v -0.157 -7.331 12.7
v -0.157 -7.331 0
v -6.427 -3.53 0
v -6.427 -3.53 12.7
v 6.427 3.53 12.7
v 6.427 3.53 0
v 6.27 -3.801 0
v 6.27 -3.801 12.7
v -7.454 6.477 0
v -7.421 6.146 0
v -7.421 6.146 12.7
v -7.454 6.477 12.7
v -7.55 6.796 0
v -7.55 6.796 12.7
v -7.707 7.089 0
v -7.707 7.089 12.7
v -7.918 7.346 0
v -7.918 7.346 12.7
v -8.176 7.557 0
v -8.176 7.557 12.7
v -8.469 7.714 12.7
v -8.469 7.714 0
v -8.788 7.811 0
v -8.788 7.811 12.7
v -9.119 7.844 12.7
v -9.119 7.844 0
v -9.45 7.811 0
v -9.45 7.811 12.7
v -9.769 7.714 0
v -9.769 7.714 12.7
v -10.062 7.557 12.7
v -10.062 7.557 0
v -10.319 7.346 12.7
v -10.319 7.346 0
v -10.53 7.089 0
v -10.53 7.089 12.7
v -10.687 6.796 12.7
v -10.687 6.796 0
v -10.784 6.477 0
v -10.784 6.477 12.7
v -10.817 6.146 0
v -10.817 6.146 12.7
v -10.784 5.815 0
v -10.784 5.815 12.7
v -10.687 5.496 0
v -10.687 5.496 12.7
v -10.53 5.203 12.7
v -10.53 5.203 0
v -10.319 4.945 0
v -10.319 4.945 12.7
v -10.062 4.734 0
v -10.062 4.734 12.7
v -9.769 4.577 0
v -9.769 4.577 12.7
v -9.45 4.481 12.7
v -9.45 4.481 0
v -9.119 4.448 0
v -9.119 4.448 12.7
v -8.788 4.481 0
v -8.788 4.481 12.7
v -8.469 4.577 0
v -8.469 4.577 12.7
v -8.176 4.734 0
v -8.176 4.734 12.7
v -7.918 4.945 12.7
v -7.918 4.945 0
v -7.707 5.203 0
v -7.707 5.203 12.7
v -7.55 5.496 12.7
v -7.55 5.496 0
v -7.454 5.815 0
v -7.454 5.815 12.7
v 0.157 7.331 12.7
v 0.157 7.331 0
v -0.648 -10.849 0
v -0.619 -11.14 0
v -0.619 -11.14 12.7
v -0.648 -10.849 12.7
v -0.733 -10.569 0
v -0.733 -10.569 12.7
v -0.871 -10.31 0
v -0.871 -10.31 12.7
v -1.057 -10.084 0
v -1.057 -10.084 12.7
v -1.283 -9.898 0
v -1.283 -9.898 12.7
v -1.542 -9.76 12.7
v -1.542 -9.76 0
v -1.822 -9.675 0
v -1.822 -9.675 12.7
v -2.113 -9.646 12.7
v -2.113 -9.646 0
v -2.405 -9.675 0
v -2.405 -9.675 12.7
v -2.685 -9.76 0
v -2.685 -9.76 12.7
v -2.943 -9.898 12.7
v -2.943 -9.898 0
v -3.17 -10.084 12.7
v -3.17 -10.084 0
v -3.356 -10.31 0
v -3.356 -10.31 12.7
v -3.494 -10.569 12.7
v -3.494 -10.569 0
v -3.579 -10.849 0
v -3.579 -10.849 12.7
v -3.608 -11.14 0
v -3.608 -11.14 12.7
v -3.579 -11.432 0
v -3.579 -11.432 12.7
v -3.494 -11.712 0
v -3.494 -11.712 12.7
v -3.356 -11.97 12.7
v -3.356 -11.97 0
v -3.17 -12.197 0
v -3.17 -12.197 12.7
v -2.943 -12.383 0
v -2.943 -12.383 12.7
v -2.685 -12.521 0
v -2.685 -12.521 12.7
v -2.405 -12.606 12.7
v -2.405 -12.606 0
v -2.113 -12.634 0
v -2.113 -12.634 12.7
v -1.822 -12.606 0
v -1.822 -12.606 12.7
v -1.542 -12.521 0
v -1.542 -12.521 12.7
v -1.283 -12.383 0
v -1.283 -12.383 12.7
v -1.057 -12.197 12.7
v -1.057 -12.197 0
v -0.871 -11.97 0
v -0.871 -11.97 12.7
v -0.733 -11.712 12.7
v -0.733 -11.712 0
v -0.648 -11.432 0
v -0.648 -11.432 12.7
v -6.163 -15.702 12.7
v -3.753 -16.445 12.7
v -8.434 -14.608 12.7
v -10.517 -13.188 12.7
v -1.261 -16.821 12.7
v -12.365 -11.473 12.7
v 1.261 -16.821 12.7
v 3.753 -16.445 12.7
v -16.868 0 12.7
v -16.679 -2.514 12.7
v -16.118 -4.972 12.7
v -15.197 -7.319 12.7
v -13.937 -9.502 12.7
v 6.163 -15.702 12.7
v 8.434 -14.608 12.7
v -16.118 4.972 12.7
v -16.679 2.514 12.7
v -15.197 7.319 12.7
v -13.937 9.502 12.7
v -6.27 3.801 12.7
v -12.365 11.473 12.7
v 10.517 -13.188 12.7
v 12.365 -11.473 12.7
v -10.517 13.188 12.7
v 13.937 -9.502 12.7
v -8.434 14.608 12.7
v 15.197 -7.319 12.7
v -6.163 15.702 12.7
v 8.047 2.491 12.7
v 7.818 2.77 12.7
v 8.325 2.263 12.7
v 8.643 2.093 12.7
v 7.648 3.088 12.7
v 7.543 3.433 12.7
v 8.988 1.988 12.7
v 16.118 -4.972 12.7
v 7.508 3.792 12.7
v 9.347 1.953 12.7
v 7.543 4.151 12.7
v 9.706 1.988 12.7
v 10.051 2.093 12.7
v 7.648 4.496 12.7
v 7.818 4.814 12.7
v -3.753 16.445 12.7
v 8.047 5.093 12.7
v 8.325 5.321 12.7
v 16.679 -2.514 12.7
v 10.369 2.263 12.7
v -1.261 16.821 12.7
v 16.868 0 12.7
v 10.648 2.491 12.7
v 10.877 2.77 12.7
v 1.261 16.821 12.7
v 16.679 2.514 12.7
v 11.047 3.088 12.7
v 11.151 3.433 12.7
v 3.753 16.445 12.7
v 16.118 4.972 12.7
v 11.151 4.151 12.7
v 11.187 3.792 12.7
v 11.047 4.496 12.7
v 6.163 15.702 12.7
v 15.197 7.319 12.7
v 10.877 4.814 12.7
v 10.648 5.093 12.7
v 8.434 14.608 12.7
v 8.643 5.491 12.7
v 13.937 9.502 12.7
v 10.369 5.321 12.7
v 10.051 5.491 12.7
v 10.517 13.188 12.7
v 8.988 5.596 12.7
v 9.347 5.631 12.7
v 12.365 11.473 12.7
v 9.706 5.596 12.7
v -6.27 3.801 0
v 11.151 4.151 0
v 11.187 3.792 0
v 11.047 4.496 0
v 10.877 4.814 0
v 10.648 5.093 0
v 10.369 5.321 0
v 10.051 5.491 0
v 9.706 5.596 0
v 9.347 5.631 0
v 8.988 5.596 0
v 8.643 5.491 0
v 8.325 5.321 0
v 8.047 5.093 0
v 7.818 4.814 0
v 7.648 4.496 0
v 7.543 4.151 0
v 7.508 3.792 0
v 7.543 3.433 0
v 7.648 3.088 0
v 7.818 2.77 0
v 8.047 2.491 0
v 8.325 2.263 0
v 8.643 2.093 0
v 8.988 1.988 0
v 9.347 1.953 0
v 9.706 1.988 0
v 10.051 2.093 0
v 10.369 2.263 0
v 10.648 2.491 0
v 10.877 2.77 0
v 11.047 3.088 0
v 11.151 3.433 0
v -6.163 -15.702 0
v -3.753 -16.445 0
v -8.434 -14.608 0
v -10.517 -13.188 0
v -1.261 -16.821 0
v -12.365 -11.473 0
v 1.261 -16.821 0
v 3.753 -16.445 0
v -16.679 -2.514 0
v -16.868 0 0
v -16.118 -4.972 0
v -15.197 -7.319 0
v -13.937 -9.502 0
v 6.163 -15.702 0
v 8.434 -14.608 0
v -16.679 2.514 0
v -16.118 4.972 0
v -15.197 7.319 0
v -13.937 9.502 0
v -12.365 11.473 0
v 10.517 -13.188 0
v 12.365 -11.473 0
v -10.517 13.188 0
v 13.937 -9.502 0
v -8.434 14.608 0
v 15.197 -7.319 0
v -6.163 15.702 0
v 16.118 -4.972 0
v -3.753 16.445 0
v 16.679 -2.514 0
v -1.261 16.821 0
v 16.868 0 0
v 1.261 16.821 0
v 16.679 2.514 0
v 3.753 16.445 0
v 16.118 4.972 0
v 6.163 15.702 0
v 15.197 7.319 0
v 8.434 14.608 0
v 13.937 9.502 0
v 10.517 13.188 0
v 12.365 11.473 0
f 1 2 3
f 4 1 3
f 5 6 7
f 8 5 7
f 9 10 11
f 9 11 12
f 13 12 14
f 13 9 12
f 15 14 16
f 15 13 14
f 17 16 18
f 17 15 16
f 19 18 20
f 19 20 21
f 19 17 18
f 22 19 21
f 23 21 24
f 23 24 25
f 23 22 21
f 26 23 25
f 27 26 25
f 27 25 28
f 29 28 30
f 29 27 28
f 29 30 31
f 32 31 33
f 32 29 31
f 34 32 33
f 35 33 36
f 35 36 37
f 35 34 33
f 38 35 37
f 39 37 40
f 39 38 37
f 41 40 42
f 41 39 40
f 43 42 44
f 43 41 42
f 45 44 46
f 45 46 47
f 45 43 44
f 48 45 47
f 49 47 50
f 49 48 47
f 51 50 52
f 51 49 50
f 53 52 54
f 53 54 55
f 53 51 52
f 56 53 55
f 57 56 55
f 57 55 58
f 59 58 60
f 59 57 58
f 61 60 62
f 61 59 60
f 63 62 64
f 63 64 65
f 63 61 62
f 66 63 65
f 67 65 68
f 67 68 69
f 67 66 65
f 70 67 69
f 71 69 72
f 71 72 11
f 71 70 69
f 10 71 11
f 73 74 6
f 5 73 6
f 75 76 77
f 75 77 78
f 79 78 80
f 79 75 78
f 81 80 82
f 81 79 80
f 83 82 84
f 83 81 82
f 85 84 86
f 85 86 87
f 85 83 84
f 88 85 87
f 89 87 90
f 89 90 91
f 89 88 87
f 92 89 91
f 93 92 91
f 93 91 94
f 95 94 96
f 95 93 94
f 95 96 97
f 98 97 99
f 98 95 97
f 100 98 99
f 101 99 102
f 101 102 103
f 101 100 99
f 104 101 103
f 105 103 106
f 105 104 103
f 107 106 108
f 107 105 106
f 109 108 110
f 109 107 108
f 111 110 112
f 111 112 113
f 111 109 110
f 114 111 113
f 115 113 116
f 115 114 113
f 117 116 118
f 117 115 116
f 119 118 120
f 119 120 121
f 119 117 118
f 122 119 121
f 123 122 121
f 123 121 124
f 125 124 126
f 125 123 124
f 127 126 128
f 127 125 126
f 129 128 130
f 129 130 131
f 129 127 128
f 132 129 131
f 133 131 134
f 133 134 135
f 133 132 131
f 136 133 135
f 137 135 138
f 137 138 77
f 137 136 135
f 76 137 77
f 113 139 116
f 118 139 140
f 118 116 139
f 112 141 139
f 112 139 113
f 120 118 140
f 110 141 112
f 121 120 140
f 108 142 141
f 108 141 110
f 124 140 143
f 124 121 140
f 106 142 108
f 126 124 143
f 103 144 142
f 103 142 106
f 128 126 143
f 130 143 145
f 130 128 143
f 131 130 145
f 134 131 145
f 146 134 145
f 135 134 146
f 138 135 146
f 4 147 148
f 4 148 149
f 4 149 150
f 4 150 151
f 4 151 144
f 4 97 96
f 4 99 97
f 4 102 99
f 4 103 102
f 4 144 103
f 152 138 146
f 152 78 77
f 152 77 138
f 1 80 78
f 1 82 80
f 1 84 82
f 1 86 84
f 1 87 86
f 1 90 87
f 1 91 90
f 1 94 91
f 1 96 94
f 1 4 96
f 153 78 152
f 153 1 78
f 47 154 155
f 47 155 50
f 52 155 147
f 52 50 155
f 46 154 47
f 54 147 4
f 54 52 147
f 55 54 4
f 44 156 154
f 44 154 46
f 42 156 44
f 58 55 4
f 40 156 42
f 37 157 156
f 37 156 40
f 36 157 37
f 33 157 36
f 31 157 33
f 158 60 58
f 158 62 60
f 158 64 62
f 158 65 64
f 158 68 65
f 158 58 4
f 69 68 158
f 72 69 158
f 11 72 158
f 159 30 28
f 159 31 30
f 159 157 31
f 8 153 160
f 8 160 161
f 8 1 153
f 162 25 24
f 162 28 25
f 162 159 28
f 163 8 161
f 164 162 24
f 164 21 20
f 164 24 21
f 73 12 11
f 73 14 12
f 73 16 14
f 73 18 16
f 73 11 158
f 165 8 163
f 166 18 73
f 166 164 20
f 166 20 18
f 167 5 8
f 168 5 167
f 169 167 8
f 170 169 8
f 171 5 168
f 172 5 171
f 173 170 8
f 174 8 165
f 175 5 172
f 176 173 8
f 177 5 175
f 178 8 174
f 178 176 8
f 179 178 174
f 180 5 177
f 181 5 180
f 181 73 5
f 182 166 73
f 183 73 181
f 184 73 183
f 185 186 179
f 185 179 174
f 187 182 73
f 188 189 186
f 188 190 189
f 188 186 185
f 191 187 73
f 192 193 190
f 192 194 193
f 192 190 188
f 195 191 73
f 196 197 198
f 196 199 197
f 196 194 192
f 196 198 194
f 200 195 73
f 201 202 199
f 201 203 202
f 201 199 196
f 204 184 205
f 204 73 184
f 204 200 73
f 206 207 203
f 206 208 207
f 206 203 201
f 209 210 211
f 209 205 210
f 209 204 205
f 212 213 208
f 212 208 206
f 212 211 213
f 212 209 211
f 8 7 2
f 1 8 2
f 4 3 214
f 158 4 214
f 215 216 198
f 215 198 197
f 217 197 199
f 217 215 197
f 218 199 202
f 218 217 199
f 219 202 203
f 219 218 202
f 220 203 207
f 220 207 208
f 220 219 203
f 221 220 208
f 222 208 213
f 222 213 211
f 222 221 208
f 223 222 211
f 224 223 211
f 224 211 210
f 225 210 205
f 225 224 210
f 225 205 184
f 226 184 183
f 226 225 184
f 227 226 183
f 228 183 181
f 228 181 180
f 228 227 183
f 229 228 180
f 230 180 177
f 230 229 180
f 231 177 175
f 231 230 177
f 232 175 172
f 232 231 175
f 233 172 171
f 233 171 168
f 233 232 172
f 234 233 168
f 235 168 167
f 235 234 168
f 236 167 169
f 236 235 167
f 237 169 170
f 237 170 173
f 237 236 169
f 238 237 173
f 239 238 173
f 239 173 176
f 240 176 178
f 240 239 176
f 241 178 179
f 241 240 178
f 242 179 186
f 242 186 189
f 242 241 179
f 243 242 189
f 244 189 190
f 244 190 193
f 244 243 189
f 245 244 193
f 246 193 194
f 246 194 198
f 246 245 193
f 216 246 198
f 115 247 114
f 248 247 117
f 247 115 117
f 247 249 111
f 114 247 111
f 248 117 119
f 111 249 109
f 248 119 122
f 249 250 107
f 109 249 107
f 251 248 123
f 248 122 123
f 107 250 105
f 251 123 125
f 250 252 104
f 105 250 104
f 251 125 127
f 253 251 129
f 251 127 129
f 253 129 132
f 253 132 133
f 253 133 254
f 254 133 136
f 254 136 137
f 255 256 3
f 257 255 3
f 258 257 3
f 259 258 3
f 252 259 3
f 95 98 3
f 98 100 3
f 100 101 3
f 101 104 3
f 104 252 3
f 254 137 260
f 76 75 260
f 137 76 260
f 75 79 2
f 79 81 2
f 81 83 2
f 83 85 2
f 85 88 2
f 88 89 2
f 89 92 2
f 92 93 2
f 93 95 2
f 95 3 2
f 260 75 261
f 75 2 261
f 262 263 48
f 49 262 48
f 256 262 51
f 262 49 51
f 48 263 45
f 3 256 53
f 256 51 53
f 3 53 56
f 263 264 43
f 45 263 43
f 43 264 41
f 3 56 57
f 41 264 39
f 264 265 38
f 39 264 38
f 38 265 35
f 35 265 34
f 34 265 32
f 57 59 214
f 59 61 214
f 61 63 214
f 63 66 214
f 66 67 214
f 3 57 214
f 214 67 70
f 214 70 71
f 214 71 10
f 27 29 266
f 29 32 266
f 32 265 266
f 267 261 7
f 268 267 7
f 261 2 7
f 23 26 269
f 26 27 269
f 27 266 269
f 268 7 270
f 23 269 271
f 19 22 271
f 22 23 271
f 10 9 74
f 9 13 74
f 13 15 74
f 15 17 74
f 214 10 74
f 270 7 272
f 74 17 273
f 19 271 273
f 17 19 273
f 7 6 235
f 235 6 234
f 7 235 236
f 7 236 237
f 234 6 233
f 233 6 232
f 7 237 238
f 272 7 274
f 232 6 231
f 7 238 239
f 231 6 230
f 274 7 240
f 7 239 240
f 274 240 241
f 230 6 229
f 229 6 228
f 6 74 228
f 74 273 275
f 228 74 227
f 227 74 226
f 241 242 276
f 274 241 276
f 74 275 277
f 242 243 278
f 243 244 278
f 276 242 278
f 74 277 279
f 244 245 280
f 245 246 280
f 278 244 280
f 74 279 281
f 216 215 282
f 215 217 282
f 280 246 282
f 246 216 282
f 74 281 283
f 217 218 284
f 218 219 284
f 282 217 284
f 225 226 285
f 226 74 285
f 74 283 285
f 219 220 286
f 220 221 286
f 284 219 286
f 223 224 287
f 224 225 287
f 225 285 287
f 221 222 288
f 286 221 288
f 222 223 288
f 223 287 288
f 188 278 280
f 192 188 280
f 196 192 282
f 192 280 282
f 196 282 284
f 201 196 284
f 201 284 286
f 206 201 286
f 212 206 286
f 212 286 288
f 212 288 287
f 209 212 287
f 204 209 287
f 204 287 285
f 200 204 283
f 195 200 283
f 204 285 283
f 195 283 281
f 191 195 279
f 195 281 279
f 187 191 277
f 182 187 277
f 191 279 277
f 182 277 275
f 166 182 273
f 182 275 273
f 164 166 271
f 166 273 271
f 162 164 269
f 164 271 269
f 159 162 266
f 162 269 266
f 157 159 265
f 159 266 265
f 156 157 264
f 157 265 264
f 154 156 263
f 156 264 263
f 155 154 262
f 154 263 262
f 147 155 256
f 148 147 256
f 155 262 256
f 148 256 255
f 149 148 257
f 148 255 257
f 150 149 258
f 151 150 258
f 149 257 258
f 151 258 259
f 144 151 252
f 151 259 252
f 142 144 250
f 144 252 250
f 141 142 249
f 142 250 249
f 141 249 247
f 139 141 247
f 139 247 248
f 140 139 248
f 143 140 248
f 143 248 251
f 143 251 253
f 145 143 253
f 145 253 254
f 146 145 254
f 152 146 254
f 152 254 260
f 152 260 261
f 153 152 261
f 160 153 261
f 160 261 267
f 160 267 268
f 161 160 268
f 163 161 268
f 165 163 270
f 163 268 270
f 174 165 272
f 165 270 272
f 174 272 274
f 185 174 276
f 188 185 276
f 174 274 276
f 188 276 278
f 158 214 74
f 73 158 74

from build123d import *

# Parameters (mm, degrees)
SKETCH2_R           = 16.86788292
SKETCH2_R_2         = 1.697640298
SKETCH2_R_3         = 1.839394333
SKETCH2_R_4         = 1.494089935
BOSS_EXTRUDE1_DEPTH = 12.7


with BuildPart() as part:
    # Sketch2 → Boss-Extrude1 (new body)
    with BuildSketch(Plane.XY):
        Circle(SKETCH2_R)
        with Locations((-9.118891252, 6.145879466)):
            Circle(SKETCH2_R_2, mode=Mode.SUBTRACT)
        with Locations((9.347171253, 3.791989153)):
            Circle(SKETCH2_R_3, mode=Mode.SUBTRACT)
        with Locations((-2.113411396, -11.140283228)):
            Circle(SKETCH2_R_4, mode=Mode.SUBTRACT)
        Polygon((-6.270235486, 3.800984121), (0.156631065, 7.330675279), (6.426866551, 3.529691158), (6.270235486, -3.800984121), (-0.156631065, -7.330675279), (-6.426866551, -3.529691158), align=None, mode=Mode.SUBTRACT)
    extrude(amount=BOSS_EXTRUDE1_DEPTH)


solid = part.part
